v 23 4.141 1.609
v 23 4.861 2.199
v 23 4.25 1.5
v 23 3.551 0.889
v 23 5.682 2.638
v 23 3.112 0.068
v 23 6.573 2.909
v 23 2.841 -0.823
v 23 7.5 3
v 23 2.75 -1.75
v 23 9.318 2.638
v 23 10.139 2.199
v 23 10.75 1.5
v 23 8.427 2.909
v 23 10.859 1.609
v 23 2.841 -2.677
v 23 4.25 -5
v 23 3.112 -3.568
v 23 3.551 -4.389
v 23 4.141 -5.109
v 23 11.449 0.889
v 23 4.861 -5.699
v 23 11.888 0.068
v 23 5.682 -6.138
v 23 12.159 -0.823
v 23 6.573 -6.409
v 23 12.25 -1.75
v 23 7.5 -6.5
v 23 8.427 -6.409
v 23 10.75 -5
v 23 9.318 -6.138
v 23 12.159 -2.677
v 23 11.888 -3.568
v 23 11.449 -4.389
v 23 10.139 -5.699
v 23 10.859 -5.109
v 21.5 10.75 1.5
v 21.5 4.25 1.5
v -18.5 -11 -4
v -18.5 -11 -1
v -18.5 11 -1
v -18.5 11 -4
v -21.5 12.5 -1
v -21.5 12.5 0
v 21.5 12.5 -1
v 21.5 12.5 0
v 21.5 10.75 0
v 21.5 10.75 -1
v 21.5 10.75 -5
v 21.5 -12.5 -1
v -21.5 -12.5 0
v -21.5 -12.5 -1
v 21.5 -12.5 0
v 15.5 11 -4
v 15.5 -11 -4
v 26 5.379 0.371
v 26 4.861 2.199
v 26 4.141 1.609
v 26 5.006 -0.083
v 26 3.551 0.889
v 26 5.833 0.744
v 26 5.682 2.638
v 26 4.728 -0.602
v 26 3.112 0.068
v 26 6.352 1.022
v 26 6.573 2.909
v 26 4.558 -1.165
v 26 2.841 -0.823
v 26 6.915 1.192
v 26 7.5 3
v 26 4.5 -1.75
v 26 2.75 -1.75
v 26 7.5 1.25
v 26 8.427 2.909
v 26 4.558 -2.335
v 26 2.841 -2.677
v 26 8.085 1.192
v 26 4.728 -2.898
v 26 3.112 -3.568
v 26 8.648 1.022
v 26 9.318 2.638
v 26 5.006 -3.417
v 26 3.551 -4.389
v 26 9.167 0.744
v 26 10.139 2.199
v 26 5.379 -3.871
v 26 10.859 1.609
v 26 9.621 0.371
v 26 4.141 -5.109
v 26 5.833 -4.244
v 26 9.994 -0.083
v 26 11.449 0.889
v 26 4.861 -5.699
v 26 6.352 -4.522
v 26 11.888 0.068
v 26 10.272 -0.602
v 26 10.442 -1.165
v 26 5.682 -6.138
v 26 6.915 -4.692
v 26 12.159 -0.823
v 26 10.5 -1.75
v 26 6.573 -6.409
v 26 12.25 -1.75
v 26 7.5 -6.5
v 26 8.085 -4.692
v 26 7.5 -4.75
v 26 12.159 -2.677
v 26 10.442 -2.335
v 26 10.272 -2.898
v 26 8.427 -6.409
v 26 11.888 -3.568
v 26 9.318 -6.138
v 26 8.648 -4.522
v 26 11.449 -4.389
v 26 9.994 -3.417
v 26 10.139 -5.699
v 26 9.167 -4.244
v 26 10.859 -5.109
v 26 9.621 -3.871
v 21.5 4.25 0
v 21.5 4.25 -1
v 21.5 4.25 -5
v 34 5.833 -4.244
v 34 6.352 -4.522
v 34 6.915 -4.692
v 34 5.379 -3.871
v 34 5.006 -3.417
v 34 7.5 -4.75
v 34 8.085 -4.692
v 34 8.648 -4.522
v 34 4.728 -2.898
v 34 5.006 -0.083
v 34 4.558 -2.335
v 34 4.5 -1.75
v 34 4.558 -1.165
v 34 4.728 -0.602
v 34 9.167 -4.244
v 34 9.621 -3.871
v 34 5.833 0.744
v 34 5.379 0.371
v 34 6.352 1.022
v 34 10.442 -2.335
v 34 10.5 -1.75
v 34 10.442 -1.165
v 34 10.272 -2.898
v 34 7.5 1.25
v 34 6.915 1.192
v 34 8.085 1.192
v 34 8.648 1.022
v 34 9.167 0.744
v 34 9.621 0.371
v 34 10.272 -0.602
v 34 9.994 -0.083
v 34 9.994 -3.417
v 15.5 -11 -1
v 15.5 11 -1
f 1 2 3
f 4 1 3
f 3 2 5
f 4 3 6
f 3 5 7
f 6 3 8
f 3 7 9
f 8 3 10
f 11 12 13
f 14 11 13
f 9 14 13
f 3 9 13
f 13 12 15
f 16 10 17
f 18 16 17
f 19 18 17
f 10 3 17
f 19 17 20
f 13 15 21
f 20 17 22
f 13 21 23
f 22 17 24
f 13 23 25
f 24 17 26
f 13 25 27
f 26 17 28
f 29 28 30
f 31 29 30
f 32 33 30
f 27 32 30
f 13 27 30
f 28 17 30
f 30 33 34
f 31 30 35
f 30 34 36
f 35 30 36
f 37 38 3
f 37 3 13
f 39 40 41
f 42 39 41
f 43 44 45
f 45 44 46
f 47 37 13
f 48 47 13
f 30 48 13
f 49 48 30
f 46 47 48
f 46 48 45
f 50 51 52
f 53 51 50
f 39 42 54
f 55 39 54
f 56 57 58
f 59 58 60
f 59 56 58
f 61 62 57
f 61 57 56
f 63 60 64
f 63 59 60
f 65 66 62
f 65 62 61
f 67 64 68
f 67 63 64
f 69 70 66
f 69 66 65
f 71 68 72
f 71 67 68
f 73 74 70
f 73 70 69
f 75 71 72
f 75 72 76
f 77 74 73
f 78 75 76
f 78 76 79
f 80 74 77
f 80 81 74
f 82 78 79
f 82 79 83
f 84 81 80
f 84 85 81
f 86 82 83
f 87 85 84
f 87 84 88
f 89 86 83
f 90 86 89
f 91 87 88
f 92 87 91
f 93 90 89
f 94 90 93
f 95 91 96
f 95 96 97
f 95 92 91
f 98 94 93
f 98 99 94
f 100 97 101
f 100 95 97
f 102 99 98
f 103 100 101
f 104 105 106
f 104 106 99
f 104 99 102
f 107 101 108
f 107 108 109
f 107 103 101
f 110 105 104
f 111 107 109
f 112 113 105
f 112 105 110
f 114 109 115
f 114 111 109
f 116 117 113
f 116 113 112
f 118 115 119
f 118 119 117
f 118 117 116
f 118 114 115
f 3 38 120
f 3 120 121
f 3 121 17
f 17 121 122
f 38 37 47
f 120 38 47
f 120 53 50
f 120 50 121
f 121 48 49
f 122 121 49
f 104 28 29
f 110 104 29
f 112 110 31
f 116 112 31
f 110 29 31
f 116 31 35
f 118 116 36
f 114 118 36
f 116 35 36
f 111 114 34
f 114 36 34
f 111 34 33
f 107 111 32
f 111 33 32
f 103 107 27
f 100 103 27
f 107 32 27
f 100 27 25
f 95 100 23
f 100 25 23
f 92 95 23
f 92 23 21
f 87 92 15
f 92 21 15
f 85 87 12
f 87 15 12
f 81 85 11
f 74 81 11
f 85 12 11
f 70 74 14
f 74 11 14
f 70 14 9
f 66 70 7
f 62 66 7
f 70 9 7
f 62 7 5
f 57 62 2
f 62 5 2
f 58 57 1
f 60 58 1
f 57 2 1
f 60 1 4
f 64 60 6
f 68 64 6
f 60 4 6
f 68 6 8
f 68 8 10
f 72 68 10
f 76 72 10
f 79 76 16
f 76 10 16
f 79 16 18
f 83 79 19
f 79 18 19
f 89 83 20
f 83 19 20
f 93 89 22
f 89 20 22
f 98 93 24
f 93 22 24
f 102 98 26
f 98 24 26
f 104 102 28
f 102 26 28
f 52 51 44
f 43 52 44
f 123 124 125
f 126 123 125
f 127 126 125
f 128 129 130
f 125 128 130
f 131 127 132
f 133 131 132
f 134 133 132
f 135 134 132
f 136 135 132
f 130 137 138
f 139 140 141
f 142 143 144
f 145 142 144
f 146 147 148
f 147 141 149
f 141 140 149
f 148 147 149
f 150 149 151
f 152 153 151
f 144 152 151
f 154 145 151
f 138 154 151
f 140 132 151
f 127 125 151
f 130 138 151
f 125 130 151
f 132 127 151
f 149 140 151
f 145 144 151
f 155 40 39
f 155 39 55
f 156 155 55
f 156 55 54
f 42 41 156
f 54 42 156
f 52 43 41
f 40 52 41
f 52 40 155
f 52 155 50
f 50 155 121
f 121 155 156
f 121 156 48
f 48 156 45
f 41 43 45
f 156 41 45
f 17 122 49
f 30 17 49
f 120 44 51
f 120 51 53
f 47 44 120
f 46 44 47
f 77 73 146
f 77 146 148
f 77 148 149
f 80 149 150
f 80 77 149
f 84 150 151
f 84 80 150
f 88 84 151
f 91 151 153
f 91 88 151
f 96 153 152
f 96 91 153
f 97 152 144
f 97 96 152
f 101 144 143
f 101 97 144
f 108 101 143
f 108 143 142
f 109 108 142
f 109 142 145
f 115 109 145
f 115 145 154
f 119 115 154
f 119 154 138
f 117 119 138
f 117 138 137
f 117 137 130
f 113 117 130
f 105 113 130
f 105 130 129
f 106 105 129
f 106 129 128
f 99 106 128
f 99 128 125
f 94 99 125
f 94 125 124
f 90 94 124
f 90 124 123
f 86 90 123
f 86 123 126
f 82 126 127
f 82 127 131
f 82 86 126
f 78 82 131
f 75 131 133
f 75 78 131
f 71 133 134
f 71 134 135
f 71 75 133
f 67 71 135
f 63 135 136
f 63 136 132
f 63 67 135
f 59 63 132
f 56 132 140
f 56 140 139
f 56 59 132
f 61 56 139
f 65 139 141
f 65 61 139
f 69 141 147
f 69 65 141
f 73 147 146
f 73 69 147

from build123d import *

# Parameters (mm, degrees)
SKETCH_1_W      = 43
SKETCH_1_H      = 25
EXTRUDE_1_DEPTH = 1
SKETCH_3_W      = 34
SKETCH_3_H      = 22
EXTRUDE_2_DEPTH = 4
SKETCH_4_W      = 6.5
SKETCH_4_H      = 6.5
EXTRUDE_3_DEPTH = 1.5
SKETCH_5_R      = 3
EXTRUDE_4_DEPTH = 12.5
SKETCH_6_R      = 4.75
EXTRUDE_5_DEPTH = 3


with BuildPart() as part:
    # 草图1 → 凸台-拉伸1 (new body)
    with BuildSketch(Plane.XY):
        Rectangle(SKETCH_1_W, SKETCH_1_H)
    extrude(amount=-EXTRUDE_1_DEPTH)

    # 草图3 → 凸台-拉伸2 (add)
    with BuildSketch(Plane.XY):
        with Locations((-1.5, 0)):
            Rectangle(SKETCH_3_W, SKETCH_3_H)
    extrude(amount=-EXTRUDE_2_DEPTH)

    # 草图4 → 凸台-拉伸3 (add)
    with BuildSketch(Plane(origin=(21.5, 0, 0), x_dir=(0, 0, -1), z_dir=(1, 0, 0))):
        with Locations((1.75, 7.5)):
            Rectangle(SKETCH_4_W, SKETCH_4_H)
    extrude(amount=EXTRUDE_3_DEPTH)

    # 草图5 → 凸台-拉伸4 (add)
    with BuildSketch(Plane.ZY.offset(-21.5)):
        with Locations((-1.75, 7.5)):
            Circle(SKETCH_5_R)
    extrude(amount=-EXTRUDE_4_DEPTH)

    # 草图6 → 凸台-拉伸5 (add)
    with BuildSketch(Plane(origin=(23, 0, 0), x_dir=(0, 0, -1), z_dir=(1, 0, 0))):
        with Locations((1.75, 7.5)):
            Circle(SKETCH_6_R)
    extrude(amount=EXTRUDE_5_DEPTH)


solid = part.part
